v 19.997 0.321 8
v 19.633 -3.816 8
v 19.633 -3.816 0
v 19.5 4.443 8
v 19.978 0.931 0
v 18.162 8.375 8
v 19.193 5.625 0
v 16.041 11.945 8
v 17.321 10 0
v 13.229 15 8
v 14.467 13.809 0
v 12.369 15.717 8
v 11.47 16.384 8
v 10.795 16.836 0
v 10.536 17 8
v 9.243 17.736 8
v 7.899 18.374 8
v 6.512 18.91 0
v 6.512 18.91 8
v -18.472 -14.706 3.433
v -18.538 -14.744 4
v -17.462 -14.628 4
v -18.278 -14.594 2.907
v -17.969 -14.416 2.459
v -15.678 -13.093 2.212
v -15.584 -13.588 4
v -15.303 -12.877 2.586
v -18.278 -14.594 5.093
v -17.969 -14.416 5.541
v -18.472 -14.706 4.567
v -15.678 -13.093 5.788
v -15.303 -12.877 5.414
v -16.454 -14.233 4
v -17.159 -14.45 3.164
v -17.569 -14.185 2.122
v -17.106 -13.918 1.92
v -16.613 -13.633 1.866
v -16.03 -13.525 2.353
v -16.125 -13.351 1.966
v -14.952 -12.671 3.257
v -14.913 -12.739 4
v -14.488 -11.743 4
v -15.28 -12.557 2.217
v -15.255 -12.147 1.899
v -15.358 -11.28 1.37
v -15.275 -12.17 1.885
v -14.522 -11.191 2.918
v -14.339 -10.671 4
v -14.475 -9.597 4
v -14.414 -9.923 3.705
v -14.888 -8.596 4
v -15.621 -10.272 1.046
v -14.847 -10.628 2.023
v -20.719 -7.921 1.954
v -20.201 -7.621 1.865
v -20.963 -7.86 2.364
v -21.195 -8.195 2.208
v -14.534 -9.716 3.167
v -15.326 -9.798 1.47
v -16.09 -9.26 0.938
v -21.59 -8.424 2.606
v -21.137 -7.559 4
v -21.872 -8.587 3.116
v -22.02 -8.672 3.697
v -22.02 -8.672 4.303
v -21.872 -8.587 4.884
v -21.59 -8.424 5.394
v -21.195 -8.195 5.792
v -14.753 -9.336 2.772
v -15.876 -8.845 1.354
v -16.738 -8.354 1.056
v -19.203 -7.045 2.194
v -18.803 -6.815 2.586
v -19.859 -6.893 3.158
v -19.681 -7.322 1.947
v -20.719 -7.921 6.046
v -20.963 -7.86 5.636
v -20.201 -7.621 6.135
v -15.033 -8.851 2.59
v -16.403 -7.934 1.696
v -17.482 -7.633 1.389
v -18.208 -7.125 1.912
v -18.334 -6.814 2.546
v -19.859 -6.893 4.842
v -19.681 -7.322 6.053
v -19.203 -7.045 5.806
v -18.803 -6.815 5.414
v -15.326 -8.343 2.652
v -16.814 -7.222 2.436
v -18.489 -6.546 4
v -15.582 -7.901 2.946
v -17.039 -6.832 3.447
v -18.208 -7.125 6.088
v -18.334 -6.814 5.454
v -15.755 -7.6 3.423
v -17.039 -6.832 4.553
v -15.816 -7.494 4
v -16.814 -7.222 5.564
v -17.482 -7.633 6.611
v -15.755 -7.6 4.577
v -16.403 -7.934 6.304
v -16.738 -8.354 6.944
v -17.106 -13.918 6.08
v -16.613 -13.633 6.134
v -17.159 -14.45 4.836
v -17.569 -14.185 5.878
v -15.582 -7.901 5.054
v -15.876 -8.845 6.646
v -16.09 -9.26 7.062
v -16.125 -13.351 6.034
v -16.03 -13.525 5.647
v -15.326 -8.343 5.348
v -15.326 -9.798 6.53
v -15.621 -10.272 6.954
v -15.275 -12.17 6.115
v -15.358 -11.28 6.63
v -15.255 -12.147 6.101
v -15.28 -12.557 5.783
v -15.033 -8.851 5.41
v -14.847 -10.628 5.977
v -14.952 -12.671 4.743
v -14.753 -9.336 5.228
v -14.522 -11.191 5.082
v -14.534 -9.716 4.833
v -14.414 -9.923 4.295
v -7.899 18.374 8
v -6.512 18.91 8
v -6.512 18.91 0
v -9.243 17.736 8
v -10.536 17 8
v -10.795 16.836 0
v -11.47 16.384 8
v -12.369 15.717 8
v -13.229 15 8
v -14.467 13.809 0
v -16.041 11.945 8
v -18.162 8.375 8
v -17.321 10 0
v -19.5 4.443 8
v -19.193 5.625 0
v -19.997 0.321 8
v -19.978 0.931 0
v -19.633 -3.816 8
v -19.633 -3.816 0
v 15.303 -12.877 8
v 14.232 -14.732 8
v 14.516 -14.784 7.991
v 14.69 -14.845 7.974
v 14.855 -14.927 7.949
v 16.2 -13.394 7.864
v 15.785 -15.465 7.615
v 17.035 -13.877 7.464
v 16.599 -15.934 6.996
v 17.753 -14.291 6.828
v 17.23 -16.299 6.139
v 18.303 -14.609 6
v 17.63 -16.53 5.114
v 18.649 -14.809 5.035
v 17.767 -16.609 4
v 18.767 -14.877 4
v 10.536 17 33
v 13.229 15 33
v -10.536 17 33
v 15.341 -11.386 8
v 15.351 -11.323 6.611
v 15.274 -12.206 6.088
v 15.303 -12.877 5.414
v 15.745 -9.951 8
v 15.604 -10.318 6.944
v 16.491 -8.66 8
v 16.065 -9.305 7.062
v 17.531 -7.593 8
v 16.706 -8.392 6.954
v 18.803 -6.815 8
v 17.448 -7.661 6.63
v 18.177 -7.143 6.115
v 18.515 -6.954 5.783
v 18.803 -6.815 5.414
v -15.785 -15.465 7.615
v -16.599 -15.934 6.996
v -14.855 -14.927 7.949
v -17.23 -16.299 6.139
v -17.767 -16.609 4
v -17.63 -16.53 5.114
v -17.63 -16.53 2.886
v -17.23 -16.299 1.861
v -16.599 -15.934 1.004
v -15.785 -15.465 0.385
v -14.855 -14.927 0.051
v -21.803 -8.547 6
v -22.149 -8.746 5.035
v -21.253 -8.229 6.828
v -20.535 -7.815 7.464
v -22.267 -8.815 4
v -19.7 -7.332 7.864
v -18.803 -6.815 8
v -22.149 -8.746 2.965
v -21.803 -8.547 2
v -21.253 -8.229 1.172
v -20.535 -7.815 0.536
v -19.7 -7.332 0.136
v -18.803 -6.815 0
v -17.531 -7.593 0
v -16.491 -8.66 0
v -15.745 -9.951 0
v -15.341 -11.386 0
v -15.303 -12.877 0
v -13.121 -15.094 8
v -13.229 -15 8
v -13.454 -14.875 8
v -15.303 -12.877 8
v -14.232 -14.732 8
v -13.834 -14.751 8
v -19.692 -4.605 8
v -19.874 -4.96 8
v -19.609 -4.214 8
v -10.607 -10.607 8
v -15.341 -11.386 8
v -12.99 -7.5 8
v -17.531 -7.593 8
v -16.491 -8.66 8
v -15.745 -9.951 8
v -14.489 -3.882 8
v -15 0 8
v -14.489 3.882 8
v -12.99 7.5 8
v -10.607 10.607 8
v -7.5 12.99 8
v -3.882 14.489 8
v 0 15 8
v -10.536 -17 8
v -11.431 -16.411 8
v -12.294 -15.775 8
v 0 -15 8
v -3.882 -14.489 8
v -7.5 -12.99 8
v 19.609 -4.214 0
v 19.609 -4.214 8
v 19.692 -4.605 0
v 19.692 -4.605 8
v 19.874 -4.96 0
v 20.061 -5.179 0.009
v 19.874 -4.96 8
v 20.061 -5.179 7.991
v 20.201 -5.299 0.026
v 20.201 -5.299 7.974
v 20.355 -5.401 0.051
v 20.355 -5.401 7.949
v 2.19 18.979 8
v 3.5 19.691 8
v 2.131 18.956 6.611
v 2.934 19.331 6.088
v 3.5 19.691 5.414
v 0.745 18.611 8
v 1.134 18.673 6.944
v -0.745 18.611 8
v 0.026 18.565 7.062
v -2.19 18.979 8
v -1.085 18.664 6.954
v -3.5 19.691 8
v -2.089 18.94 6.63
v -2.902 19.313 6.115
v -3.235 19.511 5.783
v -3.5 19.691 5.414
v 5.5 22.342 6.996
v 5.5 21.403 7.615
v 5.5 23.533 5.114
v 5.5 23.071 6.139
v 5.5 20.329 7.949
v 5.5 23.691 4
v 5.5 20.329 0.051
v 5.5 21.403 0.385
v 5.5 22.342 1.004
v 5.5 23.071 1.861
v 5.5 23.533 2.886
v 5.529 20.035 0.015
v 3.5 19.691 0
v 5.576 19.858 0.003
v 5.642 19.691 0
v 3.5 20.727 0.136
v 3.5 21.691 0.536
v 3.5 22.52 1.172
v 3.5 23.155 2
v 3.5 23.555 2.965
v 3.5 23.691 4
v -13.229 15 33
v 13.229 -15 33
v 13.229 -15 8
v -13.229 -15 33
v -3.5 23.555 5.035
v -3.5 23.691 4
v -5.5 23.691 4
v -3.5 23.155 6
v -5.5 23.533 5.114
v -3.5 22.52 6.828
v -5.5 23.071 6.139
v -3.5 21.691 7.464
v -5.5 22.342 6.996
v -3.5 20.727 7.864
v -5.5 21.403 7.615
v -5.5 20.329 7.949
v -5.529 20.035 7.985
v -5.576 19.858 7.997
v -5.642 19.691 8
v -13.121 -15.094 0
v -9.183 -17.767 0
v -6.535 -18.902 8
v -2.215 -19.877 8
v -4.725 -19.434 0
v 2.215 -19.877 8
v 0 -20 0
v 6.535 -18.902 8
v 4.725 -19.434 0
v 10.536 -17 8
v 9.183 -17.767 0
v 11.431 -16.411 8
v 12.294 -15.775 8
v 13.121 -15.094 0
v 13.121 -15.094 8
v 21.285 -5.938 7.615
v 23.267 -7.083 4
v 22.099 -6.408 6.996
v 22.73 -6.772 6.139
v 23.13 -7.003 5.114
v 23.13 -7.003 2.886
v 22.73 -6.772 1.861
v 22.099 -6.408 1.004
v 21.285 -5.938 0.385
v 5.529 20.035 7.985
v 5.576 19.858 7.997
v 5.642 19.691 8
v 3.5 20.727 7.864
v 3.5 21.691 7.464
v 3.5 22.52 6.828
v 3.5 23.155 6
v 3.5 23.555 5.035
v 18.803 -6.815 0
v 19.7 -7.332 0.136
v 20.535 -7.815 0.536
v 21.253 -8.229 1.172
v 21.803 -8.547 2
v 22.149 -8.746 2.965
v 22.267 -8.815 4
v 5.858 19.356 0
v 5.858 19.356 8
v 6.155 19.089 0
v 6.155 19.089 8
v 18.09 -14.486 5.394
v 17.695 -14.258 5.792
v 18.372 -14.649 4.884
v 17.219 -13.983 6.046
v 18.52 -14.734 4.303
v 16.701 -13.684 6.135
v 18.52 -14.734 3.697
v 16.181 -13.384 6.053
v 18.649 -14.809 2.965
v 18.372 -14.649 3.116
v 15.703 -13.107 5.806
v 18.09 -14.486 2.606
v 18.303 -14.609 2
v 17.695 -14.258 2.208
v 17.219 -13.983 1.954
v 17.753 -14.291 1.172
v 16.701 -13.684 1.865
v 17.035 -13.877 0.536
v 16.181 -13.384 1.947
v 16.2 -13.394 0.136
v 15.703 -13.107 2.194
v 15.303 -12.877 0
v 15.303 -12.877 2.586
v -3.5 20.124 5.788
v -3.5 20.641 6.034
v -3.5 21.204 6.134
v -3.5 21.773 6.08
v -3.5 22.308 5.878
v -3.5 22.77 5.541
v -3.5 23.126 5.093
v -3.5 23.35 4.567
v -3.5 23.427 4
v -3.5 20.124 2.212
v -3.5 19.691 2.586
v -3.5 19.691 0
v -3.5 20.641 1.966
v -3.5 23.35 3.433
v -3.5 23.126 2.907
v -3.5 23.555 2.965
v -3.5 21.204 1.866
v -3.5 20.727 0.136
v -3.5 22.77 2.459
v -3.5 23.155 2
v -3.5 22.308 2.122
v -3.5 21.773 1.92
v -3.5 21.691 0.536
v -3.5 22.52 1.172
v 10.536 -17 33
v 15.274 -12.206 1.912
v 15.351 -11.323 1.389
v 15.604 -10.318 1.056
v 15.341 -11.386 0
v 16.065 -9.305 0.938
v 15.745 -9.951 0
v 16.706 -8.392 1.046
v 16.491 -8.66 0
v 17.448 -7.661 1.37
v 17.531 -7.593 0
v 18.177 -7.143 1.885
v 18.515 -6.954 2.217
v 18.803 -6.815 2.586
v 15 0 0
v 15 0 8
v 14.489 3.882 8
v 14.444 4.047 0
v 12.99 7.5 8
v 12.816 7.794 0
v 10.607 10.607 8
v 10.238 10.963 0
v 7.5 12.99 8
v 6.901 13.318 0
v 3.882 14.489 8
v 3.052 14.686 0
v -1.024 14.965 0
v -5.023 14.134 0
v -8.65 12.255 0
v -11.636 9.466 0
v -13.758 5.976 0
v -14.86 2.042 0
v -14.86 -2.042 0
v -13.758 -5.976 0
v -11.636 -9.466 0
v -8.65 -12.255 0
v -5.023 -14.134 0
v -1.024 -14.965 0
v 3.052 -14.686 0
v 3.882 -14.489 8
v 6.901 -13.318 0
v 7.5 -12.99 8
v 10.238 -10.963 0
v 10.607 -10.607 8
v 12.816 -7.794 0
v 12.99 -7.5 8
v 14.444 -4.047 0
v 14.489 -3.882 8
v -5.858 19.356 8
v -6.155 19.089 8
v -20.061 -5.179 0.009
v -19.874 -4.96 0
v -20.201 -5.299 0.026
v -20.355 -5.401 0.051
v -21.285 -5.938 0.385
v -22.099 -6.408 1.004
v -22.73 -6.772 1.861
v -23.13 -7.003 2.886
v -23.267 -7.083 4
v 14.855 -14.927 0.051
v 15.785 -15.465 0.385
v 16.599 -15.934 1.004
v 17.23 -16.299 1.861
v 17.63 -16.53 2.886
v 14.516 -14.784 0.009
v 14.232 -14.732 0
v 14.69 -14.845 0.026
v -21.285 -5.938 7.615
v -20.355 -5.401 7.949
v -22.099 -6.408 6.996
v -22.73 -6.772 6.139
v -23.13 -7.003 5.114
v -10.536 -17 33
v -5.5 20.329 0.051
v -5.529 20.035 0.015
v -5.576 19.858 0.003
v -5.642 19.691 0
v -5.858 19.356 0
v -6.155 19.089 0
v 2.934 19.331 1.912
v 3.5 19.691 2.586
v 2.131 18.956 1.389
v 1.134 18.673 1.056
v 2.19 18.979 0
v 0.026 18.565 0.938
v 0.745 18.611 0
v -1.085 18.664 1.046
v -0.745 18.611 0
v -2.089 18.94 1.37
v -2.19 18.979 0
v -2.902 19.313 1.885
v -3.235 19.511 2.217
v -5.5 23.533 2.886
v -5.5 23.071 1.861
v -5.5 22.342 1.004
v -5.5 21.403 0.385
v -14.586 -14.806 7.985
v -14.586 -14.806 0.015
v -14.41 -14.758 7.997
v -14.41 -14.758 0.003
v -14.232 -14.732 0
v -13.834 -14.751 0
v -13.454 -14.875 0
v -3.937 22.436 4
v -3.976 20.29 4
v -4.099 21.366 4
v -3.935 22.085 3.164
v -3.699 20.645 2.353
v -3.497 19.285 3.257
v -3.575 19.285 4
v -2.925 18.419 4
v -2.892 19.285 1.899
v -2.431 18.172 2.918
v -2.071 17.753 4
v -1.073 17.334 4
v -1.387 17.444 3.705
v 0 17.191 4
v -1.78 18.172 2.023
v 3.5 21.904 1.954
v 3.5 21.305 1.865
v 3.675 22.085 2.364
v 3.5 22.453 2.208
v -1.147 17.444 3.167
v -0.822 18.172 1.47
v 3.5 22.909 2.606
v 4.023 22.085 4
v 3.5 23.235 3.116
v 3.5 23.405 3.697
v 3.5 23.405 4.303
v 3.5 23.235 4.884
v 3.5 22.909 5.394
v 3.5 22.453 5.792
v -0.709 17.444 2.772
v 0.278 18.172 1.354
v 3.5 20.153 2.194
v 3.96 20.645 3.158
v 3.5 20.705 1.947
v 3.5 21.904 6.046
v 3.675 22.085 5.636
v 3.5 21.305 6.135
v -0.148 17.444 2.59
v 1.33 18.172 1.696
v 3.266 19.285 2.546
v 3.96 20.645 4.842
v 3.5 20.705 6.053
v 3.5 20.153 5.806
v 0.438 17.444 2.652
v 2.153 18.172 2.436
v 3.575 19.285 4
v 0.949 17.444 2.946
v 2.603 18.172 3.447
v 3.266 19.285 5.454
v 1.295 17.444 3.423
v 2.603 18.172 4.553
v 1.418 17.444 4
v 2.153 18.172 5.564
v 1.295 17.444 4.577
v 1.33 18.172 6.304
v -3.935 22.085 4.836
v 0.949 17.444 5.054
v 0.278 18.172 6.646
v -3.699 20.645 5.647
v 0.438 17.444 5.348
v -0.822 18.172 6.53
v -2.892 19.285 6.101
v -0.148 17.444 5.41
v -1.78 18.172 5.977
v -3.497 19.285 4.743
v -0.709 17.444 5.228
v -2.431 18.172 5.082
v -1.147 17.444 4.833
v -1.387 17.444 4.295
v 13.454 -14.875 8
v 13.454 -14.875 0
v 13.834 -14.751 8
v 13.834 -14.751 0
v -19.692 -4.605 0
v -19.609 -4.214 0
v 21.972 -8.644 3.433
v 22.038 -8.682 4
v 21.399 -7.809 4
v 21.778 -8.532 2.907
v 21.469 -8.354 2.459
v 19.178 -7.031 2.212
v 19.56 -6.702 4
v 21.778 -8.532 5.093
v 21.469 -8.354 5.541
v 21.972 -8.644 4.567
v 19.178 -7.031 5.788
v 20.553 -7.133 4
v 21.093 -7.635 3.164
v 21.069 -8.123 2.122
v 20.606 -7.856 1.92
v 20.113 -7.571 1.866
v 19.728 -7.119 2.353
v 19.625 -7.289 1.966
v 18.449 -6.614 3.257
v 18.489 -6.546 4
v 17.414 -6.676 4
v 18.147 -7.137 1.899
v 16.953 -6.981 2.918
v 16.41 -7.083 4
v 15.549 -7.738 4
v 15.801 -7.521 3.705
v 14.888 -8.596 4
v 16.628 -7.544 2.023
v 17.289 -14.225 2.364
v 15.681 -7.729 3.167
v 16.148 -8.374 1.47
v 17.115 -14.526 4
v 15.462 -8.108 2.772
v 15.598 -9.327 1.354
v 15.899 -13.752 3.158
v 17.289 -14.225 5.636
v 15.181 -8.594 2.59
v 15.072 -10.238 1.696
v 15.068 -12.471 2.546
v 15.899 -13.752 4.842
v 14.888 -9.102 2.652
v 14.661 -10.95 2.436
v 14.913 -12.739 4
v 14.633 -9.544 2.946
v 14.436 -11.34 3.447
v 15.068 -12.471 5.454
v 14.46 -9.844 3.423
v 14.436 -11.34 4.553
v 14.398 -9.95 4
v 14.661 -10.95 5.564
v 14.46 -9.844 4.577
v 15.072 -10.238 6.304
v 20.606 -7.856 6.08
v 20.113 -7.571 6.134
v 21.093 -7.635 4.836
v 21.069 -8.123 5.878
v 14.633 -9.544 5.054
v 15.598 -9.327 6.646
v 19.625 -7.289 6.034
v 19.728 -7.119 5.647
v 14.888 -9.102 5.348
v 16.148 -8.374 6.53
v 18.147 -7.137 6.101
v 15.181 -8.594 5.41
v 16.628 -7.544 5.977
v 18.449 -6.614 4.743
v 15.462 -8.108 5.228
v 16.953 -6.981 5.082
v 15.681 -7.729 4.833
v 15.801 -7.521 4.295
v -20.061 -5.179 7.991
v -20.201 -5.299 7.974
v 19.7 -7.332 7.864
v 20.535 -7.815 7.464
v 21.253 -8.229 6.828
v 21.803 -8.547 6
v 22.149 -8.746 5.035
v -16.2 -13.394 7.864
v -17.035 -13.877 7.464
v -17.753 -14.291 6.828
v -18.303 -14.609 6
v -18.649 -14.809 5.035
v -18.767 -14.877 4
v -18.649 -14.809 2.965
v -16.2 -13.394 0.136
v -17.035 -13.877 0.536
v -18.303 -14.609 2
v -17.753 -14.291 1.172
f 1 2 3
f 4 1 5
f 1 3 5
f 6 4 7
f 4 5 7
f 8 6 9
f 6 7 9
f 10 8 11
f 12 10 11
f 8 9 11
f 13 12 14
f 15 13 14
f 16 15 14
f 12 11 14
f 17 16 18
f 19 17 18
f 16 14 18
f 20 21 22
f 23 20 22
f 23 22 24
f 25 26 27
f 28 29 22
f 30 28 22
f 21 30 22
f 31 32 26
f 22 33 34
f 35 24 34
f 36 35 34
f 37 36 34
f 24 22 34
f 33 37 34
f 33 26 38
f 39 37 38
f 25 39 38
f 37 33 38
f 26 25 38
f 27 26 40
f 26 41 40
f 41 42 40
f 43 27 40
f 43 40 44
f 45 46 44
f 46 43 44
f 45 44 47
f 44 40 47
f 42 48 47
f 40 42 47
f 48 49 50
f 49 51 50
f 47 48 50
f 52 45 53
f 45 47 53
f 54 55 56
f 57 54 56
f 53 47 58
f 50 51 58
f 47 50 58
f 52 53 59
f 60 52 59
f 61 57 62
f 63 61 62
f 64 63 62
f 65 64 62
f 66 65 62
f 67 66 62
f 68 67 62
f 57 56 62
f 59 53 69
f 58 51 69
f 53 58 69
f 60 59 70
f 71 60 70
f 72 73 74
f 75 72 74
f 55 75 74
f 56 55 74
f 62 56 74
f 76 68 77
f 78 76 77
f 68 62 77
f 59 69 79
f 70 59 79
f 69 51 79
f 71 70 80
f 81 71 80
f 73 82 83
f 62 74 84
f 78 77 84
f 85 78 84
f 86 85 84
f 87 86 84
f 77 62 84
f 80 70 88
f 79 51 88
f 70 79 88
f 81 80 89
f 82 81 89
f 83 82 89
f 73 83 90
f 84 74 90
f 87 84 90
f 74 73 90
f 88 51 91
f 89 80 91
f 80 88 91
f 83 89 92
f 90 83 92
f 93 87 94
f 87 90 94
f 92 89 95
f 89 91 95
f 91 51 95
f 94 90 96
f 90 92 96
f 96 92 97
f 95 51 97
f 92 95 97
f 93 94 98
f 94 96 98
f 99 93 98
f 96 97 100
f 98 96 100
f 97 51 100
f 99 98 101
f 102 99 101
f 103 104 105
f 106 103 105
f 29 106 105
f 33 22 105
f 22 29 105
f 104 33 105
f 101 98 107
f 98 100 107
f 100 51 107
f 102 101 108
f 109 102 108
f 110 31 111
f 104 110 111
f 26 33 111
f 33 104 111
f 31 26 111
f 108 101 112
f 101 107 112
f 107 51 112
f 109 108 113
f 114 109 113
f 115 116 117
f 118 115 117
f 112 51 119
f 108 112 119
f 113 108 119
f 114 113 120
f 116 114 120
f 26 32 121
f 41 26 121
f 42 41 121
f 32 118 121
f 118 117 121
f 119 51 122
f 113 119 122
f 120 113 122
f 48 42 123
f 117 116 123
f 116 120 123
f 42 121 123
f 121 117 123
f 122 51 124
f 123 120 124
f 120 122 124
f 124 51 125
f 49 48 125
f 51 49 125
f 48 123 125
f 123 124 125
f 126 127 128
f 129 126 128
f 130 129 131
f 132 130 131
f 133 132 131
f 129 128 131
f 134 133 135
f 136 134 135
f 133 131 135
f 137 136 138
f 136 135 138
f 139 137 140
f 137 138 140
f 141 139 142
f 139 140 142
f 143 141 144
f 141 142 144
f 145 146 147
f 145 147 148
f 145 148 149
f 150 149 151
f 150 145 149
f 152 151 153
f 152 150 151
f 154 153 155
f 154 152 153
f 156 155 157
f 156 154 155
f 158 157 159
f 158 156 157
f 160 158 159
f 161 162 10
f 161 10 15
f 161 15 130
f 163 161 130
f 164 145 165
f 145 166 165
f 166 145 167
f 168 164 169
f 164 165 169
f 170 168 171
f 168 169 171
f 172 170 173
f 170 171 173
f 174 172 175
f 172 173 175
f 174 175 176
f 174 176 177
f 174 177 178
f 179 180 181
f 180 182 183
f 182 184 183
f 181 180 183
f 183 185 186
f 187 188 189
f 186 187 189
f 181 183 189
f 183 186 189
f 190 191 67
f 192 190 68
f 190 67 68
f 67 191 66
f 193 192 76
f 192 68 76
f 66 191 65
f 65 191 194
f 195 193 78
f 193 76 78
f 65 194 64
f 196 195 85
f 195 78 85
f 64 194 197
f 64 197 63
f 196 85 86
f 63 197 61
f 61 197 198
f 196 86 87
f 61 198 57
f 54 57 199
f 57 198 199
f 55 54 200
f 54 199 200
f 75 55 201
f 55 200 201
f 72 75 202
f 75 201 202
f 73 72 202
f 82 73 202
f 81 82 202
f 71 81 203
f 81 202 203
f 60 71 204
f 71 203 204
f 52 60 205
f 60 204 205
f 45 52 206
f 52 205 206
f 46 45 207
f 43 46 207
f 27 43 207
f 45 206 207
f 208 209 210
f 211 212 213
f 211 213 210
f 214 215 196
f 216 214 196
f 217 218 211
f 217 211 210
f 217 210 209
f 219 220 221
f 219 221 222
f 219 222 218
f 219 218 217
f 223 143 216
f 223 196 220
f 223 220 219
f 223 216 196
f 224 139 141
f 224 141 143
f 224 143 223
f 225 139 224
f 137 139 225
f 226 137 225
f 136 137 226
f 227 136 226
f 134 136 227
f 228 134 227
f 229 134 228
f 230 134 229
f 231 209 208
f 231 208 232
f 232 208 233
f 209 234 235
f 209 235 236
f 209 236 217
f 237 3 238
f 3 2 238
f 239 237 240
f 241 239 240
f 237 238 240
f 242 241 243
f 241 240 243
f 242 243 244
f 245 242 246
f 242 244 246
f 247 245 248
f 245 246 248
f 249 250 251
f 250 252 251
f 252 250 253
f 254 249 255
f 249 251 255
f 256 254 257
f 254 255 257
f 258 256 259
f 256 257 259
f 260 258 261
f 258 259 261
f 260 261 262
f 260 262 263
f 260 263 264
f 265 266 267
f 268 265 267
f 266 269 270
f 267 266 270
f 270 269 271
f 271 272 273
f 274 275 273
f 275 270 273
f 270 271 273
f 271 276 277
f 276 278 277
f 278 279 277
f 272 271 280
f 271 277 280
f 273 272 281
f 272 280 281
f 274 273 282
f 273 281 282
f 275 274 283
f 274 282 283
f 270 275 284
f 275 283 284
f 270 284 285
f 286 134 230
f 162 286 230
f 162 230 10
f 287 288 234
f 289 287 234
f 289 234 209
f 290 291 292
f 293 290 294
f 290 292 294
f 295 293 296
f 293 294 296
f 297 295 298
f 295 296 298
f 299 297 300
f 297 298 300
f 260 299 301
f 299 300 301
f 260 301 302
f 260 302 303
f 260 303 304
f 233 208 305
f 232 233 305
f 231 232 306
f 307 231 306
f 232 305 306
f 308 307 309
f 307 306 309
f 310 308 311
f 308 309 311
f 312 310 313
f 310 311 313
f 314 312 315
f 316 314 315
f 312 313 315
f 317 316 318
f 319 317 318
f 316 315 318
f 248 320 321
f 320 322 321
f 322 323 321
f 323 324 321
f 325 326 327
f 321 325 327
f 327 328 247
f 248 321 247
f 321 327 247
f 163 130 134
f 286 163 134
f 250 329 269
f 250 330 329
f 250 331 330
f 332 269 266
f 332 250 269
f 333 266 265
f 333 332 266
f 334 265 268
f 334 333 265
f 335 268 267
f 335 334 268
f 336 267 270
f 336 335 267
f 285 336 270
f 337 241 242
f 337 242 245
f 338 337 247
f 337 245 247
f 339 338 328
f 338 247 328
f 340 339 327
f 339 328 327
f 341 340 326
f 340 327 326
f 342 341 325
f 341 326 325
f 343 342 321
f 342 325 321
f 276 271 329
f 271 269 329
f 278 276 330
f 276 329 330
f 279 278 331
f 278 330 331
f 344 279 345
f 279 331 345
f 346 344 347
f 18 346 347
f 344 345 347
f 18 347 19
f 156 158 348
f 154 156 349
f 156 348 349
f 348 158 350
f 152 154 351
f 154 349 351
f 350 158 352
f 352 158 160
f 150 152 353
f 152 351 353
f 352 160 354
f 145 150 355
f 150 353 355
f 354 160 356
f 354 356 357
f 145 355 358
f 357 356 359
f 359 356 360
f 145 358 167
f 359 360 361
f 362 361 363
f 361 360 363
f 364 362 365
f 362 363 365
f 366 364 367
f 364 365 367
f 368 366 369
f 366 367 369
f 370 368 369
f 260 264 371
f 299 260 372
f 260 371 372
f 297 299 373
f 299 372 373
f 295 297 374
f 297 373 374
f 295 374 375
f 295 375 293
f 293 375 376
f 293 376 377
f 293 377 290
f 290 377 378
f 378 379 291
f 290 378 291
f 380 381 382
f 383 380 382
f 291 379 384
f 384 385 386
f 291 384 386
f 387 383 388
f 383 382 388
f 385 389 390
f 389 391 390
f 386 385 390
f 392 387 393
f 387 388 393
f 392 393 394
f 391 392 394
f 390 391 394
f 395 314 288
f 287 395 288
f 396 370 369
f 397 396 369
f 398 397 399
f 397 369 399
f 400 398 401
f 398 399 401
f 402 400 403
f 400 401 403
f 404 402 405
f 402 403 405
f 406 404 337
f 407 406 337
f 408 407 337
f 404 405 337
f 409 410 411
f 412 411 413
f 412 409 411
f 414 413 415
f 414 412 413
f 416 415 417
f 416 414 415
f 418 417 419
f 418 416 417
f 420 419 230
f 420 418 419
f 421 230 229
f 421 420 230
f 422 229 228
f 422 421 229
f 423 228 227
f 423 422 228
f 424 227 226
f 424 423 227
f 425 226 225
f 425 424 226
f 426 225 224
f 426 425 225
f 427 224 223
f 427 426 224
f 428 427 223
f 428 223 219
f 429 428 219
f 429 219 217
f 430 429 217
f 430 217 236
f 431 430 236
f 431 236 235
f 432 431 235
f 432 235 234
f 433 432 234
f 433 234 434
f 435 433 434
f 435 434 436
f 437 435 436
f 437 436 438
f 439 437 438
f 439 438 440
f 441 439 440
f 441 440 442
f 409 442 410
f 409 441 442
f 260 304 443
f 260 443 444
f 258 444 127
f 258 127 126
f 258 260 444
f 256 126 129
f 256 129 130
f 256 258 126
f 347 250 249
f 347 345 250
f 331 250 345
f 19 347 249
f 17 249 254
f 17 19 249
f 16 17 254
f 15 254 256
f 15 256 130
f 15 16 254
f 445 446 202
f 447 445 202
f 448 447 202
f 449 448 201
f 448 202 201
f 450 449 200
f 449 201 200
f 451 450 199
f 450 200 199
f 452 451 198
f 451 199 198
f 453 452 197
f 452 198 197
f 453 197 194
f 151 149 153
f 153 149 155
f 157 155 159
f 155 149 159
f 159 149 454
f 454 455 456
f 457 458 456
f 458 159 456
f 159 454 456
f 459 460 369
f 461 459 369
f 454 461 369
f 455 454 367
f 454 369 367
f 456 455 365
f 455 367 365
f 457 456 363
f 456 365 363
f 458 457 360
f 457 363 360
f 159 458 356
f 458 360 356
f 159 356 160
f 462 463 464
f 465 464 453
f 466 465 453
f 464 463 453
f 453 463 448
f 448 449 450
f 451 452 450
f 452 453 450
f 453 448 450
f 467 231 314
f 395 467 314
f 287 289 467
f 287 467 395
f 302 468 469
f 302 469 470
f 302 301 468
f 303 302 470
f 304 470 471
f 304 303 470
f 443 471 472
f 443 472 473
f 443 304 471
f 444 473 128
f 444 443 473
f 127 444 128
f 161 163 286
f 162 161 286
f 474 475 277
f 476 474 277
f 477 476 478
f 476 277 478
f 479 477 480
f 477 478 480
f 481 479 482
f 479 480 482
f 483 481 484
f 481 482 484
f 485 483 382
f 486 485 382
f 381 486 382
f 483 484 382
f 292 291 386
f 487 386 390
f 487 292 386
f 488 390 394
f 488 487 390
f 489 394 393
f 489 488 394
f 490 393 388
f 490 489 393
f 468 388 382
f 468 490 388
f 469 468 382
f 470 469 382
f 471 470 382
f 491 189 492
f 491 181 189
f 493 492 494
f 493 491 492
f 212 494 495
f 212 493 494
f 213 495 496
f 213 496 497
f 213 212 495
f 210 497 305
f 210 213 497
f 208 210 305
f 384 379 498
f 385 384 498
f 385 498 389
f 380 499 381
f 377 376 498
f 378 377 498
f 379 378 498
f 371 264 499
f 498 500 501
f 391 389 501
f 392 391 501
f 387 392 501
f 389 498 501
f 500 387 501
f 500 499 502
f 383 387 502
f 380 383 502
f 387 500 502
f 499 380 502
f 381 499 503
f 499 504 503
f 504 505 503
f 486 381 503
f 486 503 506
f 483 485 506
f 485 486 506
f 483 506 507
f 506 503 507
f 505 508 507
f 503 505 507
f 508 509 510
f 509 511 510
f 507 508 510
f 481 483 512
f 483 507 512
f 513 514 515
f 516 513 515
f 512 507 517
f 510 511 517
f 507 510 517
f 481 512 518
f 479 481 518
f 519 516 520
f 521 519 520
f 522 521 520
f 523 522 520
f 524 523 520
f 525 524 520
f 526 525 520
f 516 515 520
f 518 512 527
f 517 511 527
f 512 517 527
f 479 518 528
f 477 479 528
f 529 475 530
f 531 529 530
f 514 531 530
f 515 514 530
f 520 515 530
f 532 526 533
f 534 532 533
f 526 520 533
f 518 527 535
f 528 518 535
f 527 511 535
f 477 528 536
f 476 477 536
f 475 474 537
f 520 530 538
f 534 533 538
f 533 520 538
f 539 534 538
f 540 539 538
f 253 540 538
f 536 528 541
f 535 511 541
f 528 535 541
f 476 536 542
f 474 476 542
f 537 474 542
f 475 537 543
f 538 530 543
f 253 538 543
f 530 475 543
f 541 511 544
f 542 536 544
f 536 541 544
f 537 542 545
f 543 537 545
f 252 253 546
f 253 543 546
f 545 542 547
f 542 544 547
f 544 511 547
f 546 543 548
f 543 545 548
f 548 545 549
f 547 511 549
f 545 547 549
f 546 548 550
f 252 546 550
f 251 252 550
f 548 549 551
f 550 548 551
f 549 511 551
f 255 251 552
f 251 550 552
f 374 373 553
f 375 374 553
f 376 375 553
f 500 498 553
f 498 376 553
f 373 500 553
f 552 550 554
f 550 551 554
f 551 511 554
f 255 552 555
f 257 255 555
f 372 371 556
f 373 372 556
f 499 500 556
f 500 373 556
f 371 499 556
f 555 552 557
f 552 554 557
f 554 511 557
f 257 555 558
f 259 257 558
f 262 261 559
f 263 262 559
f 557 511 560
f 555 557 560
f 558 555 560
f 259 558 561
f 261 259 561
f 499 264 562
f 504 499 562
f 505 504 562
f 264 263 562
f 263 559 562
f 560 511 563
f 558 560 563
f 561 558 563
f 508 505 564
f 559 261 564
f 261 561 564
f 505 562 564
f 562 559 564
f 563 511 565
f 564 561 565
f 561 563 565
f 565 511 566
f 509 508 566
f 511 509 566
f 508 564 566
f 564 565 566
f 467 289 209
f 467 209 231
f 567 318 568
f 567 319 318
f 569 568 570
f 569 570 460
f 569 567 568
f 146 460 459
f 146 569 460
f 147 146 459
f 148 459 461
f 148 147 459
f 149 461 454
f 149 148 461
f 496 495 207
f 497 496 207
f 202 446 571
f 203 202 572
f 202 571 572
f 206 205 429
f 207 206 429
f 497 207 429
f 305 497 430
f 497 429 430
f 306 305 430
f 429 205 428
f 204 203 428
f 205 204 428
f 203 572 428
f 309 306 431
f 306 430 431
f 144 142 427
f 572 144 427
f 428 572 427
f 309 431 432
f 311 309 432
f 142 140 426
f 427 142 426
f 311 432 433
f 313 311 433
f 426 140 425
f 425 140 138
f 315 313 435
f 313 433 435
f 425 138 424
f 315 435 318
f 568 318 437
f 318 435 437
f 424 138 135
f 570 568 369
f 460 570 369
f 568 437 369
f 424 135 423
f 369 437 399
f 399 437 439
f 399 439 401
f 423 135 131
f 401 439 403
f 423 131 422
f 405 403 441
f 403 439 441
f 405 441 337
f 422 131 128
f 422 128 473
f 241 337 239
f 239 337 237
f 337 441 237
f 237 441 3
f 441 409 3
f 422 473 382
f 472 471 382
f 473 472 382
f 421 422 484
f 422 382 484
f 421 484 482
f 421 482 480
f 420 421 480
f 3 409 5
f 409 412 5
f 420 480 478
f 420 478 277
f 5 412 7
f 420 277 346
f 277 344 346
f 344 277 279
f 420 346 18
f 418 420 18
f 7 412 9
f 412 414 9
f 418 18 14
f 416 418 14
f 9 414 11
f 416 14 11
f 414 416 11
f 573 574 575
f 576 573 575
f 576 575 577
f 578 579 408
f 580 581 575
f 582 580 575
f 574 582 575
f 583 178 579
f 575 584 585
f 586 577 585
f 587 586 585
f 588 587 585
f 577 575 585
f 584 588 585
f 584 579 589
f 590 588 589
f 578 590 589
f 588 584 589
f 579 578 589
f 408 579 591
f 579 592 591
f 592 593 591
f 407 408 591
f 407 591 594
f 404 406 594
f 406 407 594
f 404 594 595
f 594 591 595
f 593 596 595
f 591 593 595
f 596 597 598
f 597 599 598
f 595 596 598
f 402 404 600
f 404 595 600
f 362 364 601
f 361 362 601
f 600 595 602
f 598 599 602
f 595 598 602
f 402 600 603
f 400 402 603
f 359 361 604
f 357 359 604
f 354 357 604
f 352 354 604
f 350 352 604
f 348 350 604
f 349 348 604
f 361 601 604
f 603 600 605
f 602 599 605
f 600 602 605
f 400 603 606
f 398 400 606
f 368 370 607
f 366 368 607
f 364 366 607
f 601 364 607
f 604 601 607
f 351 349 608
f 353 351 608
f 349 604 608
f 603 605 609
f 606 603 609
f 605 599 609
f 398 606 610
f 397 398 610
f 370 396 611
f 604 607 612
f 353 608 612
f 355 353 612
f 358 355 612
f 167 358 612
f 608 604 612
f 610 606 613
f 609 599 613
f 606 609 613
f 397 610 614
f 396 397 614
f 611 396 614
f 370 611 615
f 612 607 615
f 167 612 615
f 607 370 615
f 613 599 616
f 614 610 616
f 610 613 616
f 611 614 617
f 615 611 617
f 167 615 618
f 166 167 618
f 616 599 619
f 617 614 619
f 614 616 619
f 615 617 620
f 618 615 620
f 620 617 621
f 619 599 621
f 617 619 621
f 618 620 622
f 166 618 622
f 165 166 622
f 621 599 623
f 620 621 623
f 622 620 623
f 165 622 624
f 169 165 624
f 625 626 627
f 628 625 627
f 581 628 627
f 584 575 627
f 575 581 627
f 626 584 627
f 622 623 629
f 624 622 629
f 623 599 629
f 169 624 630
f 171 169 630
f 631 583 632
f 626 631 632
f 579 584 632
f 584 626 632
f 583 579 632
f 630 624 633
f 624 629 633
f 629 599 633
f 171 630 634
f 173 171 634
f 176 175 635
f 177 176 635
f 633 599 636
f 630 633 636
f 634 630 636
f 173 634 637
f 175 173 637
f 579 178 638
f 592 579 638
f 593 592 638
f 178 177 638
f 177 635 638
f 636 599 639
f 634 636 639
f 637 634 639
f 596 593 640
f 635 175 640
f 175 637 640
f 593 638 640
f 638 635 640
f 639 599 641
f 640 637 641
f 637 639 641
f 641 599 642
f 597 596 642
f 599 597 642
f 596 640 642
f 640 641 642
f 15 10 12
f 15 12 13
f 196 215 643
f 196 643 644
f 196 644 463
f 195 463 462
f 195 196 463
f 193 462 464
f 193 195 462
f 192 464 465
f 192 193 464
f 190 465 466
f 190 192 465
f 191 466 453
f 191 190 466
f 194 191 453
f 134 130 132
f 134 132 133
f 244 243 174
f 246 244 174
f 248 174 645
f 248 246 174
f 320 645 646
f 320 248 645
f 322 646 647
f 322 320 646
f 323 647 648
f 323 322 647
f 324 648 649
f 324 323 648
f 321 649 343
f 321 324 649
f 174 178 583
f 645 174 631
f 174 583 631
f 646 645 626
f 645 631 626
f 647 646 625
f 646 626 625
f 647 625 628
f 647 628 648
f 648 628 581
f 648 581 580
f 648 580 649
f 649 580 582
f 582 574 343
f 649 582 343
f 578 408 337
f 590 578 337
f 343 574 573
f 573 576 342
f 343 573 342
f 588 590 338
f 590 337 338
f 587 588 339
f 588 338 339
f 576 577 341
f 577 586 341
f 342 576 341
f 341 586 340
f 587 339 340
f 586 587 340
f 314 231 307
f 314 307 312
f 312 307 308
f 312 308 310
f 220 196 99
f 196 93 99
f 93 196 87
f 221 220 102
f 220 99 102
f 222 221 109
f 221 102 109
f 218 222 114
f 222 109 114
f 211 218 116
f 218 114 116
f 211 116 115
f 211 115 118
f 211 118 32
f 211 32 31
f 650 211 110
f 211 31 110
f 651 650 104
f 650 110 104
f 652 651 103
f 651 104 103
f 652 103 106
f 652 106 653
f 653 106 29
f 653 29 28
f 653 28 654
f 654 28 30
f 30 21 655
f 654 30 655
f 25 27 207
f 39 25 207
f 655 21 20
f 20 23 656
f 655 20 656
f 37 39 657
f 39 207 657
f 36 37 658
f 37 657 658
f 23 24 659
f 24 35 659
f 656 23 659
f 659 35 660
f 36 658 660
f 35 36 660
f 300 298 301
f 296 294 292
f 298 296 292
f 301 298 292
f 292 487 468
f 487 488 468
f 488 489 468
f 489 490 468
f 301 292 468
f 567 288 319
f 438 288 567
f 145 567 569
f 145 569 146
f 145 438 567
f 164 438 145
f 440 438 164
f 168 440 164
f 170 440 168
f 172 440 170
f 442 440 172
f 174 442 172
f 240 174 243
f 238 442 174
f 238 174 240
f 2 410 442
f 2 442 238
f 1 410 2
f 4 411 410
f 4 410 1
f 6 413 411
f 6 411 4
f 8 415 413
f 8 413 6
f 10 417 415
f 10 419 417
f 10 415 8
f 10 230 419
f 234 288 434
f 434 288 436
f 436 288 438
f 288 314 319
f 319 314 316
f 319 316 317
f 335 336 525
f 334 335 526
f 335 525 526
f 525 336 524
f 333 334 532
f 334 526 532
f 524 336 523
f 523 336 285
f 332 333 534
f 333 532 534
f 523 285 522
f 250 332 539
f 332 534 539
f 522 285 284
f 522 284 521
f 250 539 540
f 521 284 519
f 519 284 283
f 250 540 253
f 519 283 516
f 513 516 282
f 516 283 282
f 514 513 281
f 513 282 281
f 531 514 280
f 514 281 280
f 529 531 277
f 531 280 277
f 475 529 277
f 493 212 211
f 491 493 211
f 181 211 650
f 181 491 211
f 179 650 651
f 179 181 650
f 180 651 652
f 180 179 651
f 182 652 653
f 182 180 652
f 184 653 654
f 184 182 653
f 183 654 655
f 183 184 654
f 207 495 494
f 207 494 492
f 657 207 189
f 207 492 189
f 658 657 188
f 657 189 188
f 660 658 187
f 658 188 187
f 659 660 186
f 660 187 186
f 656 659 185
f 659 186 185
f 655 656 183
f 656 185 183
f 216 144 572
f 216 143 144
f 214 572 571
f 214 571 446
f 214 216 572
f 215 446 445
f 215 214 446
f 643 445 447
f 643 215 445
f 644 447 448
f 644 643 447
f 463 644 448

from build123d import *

# Parameters (mm, degrees)
F0_R            = 15
F2_DEPTH        = 8
F5_COPIES_COUNT = 3
F6_R            = 3.99999
F7_R            = 1.5
F9_DEPTH        = 25


# Not quite as in the source:
# - a fillet or chamfer is up to 0.001 mm smaller than in the source, because OpenCascade refuses the exact size
# - a pattern or mirror of a feature is missing from the dataset's text; its kind, count and spacing are read off the source's solid


with BuildPart() as f2:
    # F0 (on Top) → F2 (new body)
    with BuildSketch(Plane.XY):
        with BuildLine():
            Line((-5.5, 23.6913686675), (-5.5, 19.228884523))
            ThreePointArc((-5.5, 19.228884523), (-17.3205080757, 10), (-19.4027024834, -4.8513025407))
            Line((-19.4027024834, -4.8513025407), (-23.2673271165, -7.0825446129))
            Line((-23.2673271165, -7.0825446129), (-22.2673271165, -8.8145954205))
            Line((-22.2673271165, -8.8145954205), (-18.8032255014, -6.8145954205))
            ThreePointArc((-18.8032255014, -6.8145954205), (-16.0775588327, -9.28238292), (-15.3032255014, -12.876773247))
            Line((-15.3032255014, -12.876773247), (-18.7673271165, -14.876773247))
            Line((-18.7673271165, -14.876773247), (-17.7673271165, -16.6088240546))
            Line((-17.7673271165, -16.6088240546), (-13.9027024834, -14.3775819823))
            ThreePointArc((-13.9027024834, -14.3775819823), (0, -20), (13.9027024834, -14.3775819823))
            Line((13.9027024834, -14.3775819823), (17.7673271165, -16.6088240546))
            Line((17.7673271165, -16.6088240546), (18.7673271165, -14.876773247))
            Line((18.7673271165, -14.876773247), (15.3032255014, -12.876773247))
            ThreePointArc((15.3032255014, -12.876773247), (16.0775588327, -9.28238292), (18.8032255014, -6.8145954205))
            Line((18.8032255014, -6.8145954205), (22.2673271165, -8.8145954205))
            Line((22.2673271165, -8.8145954205), (23.2673271165, -7.0825446129))
            Line((23.2673271165, -7.0825446129), (19.4027024834, -4.8513025407))
            ThreePointArc((19.4027024834, -4.8513025407), (17.3205080757, 10), (5.5, 19.228884523))
            Line((5.5, 19.228884523), (5.5, 23.6913686675))
            Line((5.5, 23.6913686675), (3.5, 23.6913686675))
            Line((3.5, 23.6913686675), (3.5, 19.6913686675))
            ThreePointArc((3.5, 19.6913686675), (0, 18.5647658399), (-3.5, 19.6913686675))
            Line((-3.5, 19.6913686675), (-3.5, 23.6913686675))
            Line((-3.5, 23.6913686675), (-5.5, 23.6913686675))
        make_face()
        Circle(F0_R, mode=Mode.SUBTRACT)
    extrude(amount=F2_DEPTH)

    # F4 (on offset) → F5 (revolve, cut)
    with BuildSketch(Plane.XY.offset(4)):
        with BuildLine():
            Line((0, 17.1913686675), (0, 25.3913686675))
            ThreePointArc((0, 25.3913686675), (-4.1, 21.2913686675), (0, 17.1913686675))
        make_face()
    f5 = revolve(axis=Axis((0, 21.2913686675, 4), (0, -1, 0)), mode=Mode.SUBTRACT)

    # F5_copies: F5 ×3 about axis
    f5_copies_axis = Axis((0, 0, 0), (0, 0, 1))
    for i in range(1, F5_COPIES_COUNT):
        add(f5.rotate(f5_copies_axis, i * 360 / F5_COPIES_COUNT), mode=Mode.SUBTRACT)

    # F6 (radius 4 in the source; OpenCascade refuses exactly that, so slightly less here)
    f6_edges = [f2.edges().sort_by_distance(p)[0] for p in [
        (-4.5, 23.691369, 8),
        (4.5, 23.691369, 8),
        (22.767327, -7.94857, 8),
        (18.267327, -15.742799, 8),
        (-18.267327, -15.742799, 8),
        (-22.767327, -7.94857, 8),
        (-18.267327, -15.742799, 0),
        (-22.767327, -7.94857, 0),
        (18.267327, -15.742799, 0),
        (22.767327, -7.94857, 0),
        (4.5, 23.691369, 0),
        (-4.5, 23.691369, 0),
    ]]
    fillet(f6_edges, radius=F6_R)

    # F7
    f7_edges = [f2.edges().sort_by_distance(p)[0] for p in [
        (-19.402702, -4.851303, 4),
        (-5.5, 19.228885, 4),
        (5.5, 19.228885, 4),
        (19.402702, -4.851303, 4),
        (13.902702, -14.377582, 4),
        (-13.902702, -14.377582, 4),
    ]]
    fillet(f7_edges, radius=F7_R)

    # F8 (on face) → F9 (join)
    with BuildSketch(Plane.XY.offset(8)):
        Polygon((-10.5356537529, 17), (-13.2287565553, 15), (-1.63e-08, 15), (13.2287565553, 15), (10.5356537529, 17), align=None)
        Polygon((13.2287565553, -15), (0, -15), (-13.2287565553, -15), (-10.5356537529, -17), (10.5356537529, -17), align=None)
    extrude(amount=F9_DEPTH)


solid = f2.part
